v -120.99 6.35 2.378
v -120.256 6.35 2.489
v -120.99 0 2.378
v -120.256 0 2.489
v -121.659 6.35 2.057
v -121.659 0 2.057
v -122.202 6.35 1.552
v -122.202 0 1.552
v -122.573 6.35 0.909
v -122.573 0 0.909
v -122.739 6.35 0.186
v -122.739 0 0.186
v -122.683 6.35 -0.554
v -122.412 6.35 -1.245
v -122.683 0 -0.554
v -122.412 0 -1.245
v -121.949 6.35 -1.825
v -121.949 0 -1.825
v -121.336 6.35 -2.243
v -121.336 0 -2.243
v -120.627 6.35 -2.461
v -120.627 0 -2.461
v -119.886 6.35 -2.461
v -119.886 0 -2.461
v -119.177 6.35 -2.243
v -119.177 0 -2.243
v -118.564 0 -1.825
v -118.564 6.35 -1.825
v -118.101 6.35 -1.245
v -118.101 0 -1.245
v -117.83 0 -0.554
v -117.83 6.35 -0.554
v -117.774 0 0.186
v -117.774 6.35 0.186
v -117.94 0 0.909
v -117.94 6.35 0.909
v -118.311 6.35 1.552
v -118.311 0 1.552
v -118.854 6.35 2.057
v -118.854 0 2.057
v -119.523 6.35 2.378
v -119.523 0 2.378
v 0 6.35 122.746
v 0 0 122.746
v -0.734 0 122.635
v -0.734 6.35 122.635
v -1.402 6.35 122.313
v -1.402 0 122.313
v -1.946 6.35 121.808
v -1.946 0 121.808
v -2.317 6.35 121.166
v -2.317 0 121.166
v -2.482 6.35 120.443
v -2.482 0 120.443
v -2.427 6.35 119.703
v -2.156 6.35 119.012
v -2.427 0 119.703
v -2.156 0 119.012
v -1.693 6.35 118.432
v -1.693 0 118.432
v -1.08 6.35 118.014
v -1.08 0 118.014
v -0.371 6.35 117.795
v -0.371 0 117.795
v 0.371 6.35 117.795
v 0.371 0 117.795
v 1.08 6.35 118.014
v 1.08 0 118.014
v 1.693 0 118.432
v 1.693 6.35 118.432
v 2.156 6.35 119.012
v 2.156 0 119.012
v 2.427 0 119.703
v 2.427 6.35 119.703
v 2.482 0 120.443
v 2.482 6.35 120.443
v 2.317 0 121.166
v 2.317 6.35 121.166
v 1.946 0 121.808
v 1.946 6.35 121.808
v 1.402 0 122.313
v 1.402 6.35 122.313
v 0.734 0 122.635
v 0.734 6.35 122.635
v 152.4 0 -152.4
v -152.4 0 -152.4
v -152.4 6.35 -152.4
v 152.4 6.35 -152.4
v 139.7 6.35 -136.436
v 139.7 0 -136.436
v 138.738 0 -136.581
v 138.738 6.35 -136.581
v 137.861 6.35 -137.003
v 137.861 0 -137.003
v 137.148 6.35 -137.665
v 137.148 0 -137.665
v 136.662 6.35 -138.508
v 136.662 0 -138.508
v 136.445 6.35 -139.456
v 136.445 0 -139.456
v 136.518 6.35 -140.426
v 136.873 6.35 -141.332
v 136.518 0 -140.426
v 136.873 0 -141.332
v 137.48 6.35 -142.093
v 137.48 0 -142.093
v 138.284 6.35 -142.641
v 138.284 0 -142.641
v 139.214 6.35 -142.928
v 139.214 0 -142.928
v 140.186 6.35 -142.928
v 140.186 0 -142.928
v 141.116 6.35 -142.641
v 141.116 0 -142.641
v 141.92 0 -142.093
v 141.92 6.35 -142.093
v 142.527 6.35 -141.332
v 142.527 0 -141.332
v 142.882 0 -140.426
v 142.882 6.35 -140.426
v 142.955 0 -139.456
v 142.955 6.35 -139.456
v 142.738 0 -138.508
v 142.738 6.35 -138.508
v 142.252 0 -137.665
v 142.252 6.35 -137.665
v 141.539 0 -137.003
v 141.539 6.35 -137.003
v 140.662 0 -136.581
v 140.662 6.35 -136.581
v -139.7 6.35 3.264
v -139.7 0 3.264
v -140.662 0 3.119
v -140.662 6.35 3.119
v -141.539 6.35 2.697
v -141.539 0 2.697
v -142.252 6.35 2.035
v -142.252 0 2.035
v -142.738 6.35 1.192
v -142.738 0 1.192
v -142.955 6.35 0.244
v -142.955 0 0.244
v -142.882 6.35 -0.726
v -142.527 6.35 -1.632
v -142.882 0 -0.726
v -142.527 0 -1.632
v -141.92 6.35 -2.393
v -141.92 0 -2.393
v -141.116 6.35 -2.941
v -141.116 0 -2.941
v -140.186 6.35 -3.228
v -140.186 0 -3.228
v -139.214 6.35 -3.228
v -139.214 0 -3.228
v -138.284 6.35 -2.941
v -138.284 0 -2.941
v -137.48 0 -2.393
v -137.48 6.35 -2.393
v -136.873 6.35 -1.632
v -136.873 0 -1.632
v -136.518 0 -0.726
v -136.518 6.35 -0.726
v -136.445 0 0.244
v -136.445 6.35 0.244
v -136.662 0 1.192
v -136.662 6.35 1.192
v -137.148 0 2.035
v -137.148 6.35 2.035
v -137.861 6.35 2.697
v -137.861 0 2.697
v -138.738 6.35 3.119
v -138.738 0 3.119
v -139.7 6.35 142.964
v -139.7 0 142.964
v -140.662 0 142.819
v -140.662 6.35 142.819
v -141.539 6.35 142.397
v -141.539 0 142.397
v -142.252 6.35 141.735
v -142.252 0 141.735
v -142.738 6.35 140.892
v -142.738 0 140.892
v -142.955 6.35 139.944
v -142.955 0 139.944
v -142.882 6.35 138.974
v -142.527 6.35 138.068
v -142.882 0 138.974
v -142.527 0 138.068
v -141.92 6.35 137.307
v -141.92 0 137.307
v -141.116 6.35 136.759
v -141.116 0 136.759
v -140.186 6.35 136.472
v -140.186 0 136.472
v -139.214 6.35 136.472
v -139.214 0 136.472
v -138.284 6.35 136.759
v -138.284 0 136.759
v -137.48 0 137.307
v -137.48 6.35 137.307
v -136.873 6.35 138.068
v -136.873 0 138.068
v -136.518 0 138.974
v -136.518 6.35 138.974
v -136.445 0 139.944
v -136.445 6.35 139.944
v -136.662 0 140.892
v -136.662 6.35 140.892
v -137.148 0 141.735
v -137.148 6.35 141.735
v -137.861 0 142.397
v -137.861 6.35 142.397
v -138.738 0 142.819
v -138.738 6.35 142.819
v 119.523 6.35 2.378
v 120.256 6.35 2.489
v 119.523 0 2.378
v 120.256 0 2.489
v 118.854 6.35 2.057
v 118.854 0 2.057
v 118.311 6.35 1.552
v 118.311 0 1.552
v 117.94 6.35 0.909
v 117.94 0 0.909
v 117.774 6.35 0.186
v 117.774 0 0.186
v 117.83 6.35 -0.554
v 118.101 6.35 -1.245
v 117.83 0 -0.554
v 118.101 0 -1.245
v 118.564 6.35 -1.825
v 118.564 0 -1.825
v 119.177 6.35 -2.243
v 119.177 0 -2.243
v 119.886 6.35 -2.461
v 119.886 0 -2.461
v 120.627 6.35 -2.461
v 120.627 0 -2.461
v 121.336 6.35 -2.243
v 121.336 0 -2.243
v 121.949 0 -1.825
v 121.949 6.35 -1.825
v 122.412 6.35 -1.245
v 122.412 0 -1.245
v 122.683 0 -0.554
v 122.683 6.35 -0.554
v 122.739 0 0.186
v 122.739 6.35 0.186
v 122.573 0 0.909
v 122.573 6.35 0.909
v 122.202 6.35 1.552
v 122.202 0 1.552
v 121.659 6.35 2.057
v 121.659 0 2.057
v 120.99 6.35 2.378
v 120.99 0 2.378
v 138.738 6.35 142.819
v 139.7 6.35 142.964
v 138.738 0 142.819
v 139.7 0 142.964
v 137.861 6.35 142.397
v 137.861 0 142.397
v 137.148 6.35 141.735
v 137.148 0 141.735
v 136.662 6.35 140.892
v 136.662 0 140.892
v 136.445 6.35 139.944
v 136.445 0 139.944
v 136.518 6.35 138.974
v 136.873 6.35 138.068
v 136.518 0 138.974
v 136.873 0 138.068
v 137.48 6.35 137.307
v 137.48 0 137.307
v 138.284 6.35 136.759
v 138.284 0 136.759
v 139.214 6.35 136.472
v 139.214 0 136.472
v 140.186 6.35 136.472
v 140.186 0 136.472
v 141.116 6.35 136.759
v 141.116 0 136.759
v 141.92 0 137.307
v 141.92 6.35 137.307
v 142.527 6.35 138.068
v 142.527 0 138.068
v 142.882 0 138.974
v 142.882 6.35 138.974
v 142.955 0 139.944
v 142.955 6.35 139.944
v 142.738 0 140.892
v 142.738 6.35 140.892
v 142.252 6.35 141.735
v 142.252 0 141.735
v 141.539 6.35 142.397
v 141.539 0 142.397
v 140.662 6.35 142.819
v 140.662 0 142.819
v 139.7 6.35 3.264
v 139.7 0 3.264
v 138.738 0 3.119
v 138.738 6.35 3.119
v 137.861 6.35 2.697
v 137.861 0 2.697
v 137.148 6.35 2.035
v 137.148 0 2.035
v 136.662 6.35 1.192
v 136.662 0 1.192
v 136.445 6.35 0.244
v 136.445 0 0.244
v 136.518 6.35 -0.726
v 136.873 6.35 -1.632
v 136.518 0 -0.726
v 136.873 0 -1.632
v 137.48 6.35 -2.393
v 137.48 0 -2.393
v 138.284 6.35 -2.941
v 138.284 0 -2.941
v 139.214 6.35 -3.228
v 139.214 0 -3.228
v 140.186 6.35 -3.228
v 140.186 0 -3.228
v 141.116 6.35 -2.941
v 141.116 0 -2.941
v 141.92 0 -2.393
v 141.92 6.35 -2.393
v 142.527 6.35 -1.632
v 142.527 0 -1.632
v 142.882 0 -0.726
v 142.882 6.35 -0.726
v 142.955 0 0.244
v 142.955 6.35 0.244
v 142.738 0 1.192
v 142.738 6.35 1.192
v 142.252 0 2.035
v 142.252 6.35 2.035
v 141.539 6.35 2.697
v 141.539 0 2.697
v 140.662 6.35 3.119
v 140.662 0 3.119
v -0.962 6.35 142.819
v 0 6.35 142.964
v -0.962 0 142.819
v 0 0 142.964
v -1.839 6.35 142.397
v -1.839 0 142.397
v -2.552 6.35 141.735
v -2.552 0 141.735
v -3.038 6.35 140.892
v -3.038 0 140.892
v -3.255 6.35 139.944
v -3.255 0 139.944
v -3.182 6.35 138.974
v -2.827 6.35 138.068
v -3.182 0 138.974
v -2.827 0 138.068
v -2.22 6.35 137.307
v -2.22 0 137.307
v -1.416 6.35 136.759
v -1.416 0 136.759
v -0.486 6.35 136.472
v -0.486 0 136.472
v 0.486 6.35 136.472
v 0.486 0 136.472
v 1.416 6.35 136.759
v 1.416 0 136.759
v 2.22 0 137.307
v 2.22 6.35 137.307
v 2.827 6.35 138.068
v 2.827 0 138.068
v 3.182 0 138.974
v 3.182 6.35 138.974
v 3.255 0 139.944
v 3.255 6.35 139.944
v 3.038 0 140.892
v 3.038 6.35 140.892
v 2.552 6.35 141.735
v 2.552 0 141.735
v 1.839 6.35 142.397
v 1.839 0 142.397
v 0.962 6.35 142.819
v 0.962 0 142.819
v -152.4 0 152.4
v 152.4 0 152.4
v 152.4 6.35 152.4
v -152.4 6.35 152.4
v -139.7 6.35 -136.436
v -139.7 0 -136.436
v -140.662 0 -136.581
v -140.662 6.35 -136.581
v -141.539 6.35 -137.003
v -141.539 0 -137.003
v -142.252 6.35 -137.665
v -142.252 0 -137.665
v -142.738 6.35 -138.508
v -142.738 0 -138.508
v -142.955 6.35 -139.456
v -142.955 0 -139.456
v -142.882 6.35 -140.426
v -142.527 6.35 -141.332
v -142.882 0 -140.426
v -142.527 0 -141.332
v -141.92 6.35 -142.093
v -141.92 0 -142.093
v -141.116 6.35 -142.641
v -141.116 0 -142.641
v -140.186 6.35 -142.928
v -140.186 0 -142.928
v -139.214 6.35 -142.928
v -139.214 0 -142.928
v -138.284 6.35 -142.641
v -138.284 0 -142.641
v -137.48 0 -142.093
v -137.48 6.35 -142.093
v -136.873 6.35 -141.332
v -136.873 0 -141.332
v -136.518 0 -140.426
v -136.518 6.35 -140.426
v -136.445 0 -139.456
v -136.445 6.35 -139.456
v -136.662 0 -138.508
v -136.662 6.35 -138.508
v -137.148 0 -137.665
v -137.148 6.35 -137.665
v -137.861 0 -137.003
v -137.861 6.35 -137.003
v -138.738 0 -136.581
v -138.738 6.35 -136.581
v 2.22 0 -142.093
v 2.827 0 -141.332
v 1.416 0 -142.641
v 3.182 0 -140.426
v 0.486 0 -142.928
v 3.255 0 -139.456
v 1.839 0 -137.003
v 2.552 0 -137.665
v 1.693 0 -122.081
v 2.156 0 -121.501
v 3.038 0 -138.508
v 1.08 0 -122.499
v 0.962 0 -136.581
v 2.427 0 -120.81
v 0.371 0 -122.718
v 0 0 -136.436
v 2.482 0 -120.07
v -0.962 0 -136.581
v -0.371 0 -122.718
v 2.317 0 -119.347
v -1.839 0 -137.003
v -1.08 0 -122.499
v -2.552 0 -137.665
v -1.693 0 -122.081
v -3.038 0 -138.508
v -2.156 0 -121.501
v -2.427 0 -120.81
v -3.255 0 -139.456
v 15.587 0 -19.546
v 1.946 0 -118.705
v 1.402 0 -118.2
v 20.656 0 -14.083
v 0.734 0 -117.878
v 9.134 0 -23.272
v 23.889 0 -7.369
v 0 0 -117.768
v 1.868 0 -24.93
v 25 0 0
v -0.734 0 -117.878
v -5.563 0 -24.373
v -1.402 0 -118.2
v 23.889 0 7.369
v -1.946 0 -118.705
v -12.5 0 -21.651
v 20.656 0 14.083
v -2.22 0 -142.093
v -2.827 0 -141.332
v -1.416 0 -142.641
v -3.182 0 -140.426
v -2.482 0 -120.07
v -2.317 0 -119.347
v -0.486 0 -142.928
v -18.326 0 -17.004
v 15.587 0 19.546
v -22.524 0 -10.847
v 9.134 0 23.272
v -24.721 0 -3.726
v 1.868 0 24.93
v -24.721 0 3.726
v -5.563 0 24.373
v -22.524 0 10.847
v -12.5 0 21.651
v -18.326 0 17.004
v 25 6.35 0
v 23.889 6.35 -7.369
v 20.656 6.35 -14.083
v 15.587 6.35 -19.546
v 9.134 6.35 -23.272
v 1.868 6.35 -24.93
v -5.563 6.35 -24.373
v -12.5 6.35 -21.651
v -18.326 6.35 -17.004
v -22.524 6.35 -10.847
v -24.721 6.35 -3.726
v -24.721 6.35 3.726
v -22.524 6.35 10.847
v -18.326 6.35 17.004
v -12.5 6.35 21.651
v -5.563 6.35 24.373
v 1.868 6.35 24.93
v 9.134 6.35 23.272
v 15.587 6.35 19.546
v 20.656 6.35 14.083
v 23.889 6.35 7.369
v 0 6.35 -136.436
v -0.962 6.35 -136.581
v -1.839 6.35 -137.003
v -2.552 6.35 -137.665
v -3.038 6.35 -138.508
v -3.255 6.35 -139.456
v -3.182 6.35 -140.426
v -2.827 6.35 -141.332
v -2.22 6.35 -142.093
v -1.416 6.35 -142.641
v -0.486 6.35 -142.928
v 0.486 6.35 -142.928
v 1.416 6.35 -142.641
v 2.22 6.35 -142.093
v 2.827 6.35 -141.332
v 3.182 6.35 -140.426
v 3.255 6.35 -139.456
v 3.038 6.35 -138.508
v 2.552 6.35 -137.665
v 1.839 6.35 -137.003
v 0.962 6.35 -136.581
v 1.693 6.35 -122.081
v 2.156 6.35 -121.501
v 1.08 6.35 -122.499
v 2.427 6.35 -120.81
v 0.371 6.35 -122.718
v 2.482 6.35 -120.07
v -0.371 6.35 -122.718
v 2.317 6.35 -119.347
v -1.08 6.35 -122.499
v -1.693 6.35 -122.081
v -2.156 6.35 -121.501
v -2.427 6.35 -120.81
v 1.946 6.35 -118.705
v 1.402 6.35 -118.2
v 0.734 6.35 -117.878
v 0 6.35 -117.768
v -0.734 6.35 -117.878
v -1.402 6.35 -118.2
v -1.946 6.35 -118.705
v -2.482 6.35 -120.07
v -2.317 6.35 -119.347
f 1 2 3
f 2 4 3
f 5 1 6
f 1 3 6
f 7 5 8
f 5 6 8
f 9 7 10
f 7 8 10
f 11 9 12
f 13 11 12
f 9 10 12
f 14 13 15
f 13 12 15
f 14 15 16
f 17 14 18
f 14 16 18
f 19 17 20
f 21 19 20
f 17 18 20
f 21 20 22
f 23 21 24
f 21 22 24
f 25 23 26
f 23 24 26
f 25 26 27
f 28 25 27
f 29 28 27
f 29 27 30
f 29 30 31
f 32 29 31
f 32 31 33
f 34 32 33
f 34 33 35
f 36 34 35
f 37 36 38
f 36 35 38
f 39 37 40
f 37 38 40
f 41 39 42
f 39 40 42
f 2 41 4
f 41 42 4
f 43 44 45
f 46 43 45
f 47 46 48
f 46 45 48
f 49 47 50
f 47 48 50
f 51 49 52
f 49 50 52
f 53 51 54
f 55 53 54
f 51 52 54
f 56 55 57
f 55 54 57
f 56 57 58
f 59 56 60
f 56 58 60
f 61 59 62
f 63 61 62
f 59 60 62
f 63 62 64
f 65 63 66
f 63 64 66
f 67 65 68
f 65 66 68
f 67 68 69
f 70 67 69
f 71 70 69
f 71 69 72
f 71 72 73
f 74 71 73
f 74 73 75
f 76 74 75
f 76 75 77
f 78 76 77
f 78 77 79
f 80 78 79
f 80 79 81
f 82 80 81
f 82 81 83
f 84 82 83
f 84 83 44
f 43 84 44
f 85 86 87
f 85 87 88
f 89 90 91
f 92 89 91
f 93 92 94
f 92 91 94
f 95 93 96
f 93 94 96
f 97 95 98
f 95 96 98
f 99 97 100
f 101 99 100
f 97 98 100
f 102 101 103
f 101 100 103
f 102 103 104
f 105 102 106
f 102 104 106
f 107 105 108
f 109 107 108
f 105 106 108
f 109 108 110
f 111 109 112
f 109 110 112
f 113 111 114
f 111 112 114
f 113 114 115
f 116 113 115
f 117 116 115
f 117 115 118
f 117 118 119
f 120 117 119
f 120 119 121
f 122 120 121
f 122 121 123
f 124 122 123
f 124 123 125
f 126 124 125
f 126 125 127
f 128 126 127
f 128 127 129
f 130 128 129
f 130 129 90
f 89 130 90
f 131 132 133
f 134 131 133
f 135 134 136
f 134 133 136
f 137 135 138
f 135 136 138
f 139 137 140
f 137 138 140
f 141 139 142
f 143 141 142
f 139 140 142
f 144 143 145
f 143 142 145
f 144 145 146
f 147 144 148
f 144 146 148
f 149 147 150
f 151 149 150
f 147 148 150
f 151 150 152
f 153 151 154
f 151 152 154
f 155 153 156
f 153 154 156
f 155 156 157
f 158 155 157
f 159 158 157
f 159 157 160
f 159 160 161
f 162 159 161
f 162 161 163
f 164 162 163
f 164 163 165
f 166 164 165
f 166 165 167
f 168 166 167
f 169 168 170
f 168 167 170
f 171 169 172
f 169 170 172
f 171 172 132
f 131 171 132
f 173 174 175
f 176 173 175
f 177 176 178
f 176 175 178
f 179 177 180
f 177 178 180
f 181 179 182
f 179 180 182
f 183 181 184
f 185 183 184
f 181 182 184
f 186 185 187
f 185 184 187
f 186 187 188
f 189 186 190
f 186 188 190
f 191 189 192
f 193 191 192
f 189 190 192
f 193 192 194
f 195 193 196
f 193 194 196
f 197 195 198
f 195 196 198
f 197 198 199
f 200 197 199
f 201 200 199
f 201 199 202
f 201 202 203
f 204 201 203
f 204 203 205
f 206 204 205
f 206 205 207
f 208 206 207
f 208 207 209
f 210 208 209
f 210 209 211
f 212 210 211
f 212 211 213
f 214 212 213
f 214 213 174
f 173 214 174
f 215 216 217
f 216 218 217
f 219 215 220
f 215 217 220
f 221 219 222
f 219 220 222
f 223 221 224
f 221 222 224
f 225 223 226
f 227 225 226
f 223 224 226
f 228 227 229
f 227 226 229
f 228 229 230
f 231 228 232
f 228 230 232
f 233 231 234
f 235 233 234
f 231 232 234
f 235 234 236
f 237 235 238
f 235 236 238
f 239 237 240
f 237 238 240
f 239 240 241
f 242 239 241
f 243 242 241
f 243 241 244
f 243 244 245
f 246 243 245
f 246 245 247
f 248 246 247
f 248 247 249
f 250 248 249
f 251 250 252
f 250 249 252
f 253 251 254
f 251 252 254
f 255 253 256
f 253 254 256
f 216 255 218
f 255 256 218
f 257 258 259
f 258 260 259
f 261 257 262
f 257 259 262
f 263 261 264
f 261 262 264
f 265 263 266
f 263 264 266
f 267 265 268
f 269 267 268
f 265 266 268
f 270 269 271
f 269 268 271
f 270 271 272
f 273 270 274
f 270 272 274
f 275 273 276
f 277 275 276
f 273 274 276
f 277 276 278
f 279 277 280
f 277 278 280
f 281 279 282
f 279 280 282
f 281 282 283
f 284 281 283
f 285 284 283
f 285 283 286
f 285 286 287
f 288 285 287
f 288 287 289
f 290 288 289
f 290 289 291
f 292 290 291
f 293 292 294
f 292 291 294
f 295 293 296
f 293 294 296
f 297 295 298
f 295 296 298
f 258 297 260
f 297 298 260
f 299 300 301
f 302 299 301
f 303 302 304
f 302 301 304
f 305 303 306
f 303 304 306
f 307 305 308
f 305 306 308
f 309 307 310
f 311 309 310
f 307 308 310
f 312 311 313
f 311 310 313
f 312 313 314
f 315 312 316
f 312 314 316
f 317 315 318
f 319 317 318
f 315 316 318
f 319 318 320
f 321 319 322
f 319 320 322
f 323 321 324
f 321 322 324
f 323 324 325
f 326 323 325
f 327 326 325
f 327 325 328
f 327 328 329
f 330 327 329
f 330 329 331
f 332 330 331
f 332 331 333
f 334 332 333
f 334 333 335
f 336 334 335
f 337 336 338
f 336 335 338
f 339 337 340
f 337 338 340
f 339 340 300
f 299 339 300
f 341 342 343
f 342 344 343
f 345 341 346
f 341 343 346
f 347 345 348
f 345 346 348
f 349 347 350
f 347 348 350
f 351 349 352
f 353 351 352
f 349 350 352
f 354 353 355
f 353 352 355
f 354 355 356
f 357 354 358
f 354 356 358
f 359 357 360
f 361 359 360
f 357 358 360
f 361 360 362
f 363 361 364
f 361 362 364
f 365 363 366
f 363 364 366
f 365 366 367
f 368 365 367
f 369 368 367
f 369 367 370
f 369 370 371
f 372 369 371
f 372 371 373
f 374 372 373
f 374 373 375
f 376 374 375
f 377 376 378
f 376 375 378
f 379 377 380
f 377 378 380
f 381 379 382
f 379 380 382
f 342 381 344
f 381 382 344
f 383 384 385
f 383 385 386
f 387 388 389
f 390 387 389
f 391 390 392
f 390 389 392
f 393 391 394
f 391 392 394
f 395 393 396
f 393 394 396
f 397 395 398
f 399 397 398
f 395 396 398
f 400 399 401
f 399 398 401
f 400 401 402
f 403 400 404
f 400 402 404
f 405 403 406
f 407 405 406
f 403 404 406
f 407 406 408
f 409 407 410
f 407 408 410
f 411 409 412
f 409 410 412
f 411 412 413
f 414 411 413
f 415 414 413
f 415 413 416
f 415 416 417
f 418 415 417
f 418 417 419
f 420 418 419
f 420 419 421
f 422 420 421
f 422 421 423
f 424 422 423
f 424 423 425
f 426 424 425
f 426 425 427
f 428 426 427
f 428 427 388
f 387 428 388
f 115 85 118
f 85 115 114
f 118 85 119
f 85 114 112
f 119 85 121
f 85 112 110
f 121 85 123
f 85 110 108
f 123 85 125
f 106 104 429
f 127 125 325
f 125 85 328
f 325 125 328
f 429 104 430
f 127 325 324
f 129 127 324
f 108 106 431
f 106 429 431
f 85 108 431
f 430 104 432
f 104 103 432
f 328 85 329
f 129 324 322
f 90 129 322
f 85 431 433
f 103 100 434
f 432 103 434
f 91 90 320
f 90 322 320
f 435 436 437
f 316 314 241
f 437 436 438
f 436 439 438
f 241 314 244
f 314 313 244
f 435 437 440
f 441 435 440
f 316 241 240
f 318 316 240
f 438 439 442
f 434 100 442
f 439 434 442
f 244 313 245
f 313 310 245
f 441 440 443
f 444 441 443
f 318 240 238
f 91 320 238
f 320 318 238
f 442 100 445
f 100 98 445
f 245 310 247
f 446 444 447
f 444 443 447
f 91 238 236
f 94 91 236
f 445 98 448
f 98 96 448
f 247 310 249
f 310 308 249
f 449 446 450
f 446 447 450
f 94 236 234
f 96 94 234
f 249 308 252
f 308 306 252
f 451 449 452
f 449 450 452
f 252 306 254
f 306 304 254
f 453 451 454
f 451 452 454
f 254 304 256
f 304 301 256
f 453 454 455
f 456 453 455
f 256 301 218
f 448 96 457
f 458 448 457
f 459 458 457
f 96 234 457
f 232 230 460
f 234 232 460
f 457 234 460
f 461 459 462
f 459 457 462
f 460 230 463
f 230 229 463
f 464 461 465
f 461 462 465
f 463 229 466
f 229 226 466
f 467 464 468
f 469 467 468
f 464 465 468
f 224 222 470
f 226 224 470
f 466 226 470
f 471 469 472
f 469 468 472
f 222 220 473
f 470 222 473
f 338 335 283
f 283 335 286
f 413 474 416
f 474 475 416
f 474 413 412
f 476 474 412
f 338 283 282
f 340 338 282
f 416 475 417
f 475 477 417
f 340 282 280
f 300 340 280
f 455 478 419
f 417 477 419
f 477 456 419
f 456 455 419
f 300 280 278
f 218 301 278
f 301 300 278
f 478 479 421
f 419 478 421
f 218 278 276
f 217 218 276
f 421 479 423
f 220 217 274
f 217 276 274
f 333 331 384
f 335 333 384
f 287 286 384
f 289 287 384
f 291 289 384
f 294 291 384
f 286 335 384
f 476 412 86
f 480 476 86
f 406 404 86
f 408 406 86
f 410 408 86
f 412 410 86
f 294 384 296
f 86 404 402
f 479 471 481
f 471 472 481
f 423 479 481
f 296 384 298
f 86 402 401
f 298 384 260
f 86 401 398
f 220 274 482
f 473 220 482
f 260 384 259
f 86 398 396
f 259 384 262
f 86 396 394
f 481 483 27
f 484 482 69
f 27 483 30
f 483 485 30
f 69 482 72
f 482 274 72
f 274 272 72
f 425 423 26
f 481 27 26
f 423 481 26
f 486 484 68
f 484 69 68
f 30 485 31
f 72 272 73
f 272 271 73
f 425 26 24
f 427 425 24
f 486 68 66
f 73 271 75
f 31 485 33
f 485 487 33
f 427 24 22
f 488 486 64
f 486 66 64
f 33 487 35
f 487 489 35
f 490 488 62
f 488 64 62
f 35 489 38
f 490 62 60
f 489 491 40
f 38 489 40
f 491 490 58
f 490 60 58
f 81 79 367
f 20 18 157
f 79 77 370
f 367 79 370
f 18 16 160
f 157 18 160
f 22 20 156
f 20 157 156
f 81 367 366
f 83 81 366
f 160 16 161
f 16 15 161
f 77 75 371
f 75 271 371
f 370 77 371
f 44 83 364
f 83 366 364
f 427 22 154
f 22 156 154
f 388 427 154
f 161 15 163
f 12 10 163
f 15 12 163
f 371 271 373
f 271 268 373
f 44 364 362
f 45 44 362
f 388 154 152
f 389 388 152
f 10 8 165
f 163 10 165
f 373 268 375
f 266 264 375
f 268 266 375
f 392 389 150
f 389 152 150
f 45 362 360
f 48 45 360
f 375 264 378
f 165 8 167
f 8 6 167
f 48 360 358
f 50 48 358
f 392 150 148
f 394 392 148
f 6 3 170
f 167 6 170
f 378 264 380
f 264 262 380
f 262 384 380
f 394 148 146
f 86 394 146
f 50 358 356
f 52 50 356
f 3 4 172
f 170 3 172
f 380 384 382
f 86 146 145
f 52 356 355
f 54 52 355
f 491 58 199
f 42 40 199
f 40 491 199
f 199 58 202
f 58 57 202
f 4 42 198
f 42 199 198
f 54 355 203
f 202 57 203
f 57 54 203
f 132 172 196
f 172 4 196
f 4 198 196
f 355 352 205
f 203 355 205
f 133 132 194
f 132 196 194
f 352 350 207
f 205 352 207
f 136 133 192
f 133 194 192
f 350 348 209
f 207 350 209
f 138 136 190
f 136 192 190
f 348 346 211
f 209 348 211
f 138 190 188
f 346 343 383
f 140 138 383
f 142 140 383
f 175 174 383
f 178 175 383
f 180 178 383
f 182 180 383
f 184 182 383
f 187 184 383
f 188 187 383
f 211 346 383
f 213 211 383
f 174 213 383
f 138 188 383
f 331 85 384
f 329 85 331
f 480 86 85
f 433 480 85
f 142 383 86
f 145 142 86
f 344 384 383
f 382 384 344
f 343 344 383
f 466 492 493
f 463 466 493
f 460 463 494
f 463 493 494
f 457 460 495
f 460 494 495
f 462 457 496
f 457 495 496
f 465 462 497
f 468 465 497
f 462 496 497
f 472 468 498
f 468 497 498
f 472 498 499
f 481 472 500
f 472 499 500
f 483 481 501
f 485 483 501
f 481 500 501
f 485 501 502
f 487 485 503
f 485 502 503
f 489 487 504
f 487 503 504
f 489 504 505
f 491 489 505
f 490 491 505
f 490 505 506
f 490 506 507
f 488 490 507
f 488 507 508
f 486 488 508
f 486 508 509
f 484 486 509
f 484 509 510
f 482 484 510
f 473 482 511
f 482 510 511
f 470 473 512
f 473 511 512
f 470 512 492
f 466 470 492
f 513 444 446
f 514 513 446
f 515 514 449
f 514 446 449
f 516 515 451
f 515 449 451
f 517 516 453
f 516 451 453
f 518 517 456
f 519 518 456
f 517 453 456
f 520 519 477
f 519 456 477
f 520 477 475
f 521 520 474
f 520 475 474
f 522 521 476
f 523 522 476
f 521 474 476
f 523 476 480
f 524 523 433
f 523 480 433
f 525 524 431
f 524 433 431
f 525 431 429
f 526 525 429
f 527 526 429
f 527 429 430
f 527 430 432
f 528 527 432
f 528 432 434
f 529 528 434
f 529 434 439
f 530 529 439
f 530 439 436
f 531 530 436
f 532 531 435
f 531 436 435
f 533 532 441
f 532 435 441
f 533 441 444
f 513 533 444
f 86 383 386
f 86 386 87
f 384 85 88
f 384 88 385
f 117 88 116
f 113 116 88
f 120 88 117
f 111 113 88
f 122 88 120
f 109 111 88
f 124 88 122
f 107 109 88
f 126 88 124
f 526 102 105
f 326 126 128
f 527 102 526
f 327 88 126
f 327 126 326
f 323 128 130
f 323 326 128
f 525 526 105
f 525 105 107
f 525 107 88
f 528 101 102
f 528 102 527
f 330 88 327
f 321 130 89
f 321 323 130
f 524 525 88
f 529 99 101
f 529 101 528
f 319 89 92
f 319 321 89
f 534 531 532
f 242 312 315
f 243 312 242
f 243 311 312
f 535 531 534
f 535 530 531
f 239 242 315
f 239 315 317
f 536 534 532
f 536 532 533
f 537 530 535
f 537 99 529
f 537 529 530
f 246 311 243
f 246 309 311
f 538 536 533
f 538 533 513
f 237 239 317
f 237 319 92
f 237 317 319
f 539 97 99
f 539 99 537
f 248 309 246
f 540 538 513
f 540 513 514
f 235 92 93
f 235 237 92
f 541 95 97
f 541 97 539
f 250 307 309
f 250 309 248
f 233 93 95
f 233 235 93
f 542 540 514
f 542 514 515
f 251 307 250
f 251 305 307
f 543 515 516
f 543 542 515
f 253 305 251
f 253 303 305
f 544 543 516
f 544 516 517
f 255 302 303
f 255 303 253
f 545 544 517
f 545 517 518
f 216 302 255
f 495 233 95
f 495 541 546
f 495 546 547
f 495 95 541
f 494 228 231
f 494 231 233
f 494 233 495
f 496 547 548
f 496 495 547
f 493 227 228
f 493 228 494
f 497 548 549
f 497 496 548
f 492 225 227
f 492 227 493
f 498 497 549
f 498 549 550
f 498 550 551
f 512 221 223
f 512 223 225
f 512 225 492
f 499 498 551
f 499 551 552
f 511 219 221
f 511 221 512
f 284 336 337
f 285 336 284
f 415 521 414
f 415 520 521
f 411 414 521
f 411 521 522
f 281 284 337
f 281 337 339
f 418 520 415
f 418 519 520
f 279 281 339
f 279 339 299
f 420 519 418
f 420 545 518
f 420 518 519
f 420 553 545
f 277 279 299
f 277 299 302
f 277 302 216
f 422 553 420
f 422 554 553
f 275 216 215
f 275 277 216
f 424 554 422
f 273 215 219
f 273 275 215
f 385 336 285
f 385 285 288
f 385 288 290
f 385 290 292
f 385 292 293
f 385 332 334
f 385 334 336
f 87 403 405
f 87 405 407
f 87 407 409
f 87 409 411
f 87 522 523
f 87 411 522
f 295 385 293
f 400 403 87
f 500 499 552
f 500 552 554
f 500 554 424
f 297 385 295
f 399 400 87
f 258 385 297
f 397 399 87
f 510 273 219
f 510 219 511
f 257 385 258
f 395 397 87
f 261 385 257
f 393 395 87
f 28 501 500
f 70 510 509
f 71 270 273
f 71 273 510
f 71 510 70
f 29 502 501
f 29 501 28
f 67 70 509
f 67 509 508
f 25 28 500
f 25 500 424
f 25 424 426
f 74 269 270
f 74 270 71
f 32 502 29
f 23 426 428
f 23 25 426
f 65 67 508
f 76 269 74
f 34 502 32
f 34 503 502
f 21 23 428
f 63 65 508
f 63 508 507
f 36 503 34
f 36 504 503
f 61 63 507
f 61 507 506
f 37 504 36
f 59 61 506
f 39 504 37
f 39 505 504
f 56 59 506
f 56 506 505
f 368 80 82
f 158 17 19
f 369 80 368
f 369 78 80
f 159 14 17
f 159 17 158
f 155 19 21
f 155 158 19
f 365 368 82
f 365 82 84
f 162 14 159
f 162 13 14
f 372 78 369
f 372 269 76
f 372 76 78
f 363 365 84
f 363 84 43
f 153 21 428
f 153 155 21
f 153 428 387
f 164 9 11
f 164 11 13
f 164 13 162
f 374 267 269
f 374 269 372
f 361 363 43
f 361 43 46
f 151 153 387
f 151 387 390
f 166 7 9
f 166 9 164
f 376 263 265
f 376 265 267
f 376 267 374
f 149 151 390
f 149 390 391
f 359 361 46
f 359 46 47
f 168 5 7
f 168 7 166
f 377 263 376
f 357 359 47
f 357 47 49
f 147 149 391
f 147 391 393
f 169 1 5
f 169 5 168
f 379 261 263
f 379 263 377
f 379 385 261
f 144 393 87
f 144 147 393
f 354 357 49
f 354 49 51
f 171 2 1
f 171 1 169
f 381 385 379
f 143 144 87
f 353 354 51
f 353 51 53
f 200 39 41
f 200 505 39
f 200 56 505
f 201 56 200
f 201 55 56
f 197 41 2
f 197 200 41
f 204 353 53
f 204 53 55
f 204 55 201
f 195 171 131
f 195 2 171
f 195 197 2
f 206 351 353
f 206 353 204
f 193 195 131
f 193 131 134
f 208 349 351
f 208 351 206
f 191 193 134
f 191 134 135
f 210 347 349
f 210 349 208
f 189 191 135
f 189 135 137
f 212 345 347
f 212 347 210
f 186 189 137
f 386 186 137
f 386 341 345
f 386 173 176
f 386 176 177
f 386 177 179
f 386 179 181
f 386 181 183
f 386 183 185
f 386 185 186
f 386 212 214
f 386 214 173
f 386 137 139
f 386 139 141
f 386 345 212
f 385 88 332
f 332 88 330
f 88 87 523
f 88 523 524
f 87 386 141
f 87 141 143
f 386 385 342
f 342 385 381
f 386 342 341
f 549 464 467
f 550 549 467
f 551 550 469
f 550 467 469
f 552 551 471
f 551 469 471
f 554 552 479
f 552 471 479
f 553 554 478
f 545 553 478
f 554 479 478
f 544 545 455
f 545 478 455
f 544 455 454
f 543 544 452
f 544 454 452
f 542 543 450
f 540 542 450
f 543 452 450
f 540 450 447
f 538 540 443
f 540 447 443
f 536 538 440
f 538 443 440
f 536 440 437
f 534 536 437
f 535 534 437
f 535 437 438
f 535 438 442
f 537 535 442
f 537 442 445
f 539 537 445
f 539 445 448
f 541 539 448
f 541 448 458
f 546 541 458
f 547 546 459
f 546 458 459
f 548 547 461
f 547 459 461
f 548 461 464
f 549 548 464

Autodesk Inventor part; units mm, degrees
ref_plane "YZ Plane" through (0, 0, 0) normal (1, 0, 0) x (0, 1, 0)
ref_plane "XZ Plane" through (0, 0, 0) normal (0, 1, 0) x (-1, 0, 0)
ref_plane "XY Plane" through (0, 0, 0) normal (0, 0, 1) x (1, 0, 0)
sketch "Sketch1" plane through (0, 0, 0) normal (0, 1, 0) x (-1, 0, 0)
  line L0 (-152.4, 152.4) -> (152.4, 152.4)
  line L1 (152.4, 152.4) -> (152.4, -152.4)
  line L2 (152.4, -152.4) -> (-152.4, -152.4)
  line L3 (-152.4, -152.4) -> (-152.4, 152.4)
  line L4 (-152.4, 152.4) -> (152.4, -152.4) construction
  line L5 (152.4, 152.4) -> (-152.4, -152.4) construction
  point P0 (0, 0)
  dimension "d0" = 304.8
extrude "Extrusion1" add sketch "Sketch1" along normal blind 6.35
sketch "Sketch4" plane through (0, 6.35, 0) normal (0, 1, 0) x (1, 0, 0)
  line L0 (-152.4, -152.4) -> (152.4, -152.4) construction
  line L1 (152.4, -152.4) -> (152.4, 152.4) construction
  line L2 (152.4, 152.4) -> (-152.4, 152.4) construction
  line L3 (-152.4, 152.4) -> (-152.4, -152.4) construction
  line L4 (139.7, -139.7) -> (-139.7, -139.7) construction
  line L5 (-139.7, -139.7) -> (-139.7, 139.7) construction
  line L6 (-139.7, 139.7) -> (139.7, 139.7) construction
  line L7 (139.7, 139.7) -> (139.7, -139.7) construction
  line L8 (139.7, -139.7) -> (-139.7, 139.7) construction
  line L9 (-139.7, -139.7) -> (139.7, 139.7) construction
  point P0 (0, 0)
  point P1 (0, -139.7)
  point P2 (-139.7, 0)
  point P3 (0, 139.7)
  point P4 (139.7, 0)
  dimension "d21" = 279.4
  dimension "d22" = 279.4
hole "Hole2" at (-139.7, 6.35, 139.7) at (0, 6.35, 139.7) at (-139.7, 6.35, 0) at (-139.7, 6.35, -139.7) at (0, 6.35, -139.7) at (139.7, 6.35, -139.7) at (139.7, 6.35, 0) at (139.7, 6.35, 139.7) direction (0, -1, 0) diameter 6.528 depth 19.05 tip angle 118 clearance for "Socket Head Cap Screw" size "1/4" standard "Ansi Unified Screw Threads"
sketch "Sketch2" plane through (0, 6.35, 0) normal (0, 1, 0) x (1, 0, 0)
  line L0 (-152.4, -152.4) -> (152.4, -152.4) construction
  line L1 (152.4, -152.4) -> (152.4, 152.4) construction
  line L2 (152.4, 152.4) -> (-152.4, 152.4) construction
  line L3 (-152.4, 152.4) -> (-152.4, -152.4) construction
  circle A0 centre (0, 0) radius 120.2565 construction
  line L4 (0, -152.4) -> (0, 152.4) construction
  line L5 (152.4, 152.4) -> (-152.4, 152.4) construction
  line L6 (-152.4, 0) -> (152.4, 0) construction
  point P0 (-120.2565, 0)
  point P1 (0, 120.2565)
  point P2 (120.2565, 0)
  point P3 (0, -120.2565)
  dimension "d3" = 240.513
hole "Hole1" at (-120.2565, 6.35, 0) at (0, 6.35, 120.2565) at (120.2565, 6.35, 0) at (0, 6.35, -120.2565) direction (0, -1, 0) diameter 4.978 depth 19.05 tip angle 118 thread size "1/4-20 UNC" class "2B" standard "ANSI Unified Screw Threads"
sketch "Sketch3" plane through (0, 6.35, 0) normal (0, 1, 0) x (1, 0, 0)
  line L0 (-152.4, -152.4) -> (152.4, -152.4) projected
  line L1 (152.4, -152.4) -> (152.4, 152.4) projected
  line L2 (152.4, 152.4) -> (-152.4, 152.4) projected
  line L3 (-152.4, 152.4) -> (-152.4, -152.4) projected
  circle A0 centre (0, 0) radius 25
  dimension "d18" = 50
extrude "Extrusion3" cut sketch "Sketch3" against normal through all contours A0
properties part number "turntable-adapter-top" material "Acetal Resin, Black"
